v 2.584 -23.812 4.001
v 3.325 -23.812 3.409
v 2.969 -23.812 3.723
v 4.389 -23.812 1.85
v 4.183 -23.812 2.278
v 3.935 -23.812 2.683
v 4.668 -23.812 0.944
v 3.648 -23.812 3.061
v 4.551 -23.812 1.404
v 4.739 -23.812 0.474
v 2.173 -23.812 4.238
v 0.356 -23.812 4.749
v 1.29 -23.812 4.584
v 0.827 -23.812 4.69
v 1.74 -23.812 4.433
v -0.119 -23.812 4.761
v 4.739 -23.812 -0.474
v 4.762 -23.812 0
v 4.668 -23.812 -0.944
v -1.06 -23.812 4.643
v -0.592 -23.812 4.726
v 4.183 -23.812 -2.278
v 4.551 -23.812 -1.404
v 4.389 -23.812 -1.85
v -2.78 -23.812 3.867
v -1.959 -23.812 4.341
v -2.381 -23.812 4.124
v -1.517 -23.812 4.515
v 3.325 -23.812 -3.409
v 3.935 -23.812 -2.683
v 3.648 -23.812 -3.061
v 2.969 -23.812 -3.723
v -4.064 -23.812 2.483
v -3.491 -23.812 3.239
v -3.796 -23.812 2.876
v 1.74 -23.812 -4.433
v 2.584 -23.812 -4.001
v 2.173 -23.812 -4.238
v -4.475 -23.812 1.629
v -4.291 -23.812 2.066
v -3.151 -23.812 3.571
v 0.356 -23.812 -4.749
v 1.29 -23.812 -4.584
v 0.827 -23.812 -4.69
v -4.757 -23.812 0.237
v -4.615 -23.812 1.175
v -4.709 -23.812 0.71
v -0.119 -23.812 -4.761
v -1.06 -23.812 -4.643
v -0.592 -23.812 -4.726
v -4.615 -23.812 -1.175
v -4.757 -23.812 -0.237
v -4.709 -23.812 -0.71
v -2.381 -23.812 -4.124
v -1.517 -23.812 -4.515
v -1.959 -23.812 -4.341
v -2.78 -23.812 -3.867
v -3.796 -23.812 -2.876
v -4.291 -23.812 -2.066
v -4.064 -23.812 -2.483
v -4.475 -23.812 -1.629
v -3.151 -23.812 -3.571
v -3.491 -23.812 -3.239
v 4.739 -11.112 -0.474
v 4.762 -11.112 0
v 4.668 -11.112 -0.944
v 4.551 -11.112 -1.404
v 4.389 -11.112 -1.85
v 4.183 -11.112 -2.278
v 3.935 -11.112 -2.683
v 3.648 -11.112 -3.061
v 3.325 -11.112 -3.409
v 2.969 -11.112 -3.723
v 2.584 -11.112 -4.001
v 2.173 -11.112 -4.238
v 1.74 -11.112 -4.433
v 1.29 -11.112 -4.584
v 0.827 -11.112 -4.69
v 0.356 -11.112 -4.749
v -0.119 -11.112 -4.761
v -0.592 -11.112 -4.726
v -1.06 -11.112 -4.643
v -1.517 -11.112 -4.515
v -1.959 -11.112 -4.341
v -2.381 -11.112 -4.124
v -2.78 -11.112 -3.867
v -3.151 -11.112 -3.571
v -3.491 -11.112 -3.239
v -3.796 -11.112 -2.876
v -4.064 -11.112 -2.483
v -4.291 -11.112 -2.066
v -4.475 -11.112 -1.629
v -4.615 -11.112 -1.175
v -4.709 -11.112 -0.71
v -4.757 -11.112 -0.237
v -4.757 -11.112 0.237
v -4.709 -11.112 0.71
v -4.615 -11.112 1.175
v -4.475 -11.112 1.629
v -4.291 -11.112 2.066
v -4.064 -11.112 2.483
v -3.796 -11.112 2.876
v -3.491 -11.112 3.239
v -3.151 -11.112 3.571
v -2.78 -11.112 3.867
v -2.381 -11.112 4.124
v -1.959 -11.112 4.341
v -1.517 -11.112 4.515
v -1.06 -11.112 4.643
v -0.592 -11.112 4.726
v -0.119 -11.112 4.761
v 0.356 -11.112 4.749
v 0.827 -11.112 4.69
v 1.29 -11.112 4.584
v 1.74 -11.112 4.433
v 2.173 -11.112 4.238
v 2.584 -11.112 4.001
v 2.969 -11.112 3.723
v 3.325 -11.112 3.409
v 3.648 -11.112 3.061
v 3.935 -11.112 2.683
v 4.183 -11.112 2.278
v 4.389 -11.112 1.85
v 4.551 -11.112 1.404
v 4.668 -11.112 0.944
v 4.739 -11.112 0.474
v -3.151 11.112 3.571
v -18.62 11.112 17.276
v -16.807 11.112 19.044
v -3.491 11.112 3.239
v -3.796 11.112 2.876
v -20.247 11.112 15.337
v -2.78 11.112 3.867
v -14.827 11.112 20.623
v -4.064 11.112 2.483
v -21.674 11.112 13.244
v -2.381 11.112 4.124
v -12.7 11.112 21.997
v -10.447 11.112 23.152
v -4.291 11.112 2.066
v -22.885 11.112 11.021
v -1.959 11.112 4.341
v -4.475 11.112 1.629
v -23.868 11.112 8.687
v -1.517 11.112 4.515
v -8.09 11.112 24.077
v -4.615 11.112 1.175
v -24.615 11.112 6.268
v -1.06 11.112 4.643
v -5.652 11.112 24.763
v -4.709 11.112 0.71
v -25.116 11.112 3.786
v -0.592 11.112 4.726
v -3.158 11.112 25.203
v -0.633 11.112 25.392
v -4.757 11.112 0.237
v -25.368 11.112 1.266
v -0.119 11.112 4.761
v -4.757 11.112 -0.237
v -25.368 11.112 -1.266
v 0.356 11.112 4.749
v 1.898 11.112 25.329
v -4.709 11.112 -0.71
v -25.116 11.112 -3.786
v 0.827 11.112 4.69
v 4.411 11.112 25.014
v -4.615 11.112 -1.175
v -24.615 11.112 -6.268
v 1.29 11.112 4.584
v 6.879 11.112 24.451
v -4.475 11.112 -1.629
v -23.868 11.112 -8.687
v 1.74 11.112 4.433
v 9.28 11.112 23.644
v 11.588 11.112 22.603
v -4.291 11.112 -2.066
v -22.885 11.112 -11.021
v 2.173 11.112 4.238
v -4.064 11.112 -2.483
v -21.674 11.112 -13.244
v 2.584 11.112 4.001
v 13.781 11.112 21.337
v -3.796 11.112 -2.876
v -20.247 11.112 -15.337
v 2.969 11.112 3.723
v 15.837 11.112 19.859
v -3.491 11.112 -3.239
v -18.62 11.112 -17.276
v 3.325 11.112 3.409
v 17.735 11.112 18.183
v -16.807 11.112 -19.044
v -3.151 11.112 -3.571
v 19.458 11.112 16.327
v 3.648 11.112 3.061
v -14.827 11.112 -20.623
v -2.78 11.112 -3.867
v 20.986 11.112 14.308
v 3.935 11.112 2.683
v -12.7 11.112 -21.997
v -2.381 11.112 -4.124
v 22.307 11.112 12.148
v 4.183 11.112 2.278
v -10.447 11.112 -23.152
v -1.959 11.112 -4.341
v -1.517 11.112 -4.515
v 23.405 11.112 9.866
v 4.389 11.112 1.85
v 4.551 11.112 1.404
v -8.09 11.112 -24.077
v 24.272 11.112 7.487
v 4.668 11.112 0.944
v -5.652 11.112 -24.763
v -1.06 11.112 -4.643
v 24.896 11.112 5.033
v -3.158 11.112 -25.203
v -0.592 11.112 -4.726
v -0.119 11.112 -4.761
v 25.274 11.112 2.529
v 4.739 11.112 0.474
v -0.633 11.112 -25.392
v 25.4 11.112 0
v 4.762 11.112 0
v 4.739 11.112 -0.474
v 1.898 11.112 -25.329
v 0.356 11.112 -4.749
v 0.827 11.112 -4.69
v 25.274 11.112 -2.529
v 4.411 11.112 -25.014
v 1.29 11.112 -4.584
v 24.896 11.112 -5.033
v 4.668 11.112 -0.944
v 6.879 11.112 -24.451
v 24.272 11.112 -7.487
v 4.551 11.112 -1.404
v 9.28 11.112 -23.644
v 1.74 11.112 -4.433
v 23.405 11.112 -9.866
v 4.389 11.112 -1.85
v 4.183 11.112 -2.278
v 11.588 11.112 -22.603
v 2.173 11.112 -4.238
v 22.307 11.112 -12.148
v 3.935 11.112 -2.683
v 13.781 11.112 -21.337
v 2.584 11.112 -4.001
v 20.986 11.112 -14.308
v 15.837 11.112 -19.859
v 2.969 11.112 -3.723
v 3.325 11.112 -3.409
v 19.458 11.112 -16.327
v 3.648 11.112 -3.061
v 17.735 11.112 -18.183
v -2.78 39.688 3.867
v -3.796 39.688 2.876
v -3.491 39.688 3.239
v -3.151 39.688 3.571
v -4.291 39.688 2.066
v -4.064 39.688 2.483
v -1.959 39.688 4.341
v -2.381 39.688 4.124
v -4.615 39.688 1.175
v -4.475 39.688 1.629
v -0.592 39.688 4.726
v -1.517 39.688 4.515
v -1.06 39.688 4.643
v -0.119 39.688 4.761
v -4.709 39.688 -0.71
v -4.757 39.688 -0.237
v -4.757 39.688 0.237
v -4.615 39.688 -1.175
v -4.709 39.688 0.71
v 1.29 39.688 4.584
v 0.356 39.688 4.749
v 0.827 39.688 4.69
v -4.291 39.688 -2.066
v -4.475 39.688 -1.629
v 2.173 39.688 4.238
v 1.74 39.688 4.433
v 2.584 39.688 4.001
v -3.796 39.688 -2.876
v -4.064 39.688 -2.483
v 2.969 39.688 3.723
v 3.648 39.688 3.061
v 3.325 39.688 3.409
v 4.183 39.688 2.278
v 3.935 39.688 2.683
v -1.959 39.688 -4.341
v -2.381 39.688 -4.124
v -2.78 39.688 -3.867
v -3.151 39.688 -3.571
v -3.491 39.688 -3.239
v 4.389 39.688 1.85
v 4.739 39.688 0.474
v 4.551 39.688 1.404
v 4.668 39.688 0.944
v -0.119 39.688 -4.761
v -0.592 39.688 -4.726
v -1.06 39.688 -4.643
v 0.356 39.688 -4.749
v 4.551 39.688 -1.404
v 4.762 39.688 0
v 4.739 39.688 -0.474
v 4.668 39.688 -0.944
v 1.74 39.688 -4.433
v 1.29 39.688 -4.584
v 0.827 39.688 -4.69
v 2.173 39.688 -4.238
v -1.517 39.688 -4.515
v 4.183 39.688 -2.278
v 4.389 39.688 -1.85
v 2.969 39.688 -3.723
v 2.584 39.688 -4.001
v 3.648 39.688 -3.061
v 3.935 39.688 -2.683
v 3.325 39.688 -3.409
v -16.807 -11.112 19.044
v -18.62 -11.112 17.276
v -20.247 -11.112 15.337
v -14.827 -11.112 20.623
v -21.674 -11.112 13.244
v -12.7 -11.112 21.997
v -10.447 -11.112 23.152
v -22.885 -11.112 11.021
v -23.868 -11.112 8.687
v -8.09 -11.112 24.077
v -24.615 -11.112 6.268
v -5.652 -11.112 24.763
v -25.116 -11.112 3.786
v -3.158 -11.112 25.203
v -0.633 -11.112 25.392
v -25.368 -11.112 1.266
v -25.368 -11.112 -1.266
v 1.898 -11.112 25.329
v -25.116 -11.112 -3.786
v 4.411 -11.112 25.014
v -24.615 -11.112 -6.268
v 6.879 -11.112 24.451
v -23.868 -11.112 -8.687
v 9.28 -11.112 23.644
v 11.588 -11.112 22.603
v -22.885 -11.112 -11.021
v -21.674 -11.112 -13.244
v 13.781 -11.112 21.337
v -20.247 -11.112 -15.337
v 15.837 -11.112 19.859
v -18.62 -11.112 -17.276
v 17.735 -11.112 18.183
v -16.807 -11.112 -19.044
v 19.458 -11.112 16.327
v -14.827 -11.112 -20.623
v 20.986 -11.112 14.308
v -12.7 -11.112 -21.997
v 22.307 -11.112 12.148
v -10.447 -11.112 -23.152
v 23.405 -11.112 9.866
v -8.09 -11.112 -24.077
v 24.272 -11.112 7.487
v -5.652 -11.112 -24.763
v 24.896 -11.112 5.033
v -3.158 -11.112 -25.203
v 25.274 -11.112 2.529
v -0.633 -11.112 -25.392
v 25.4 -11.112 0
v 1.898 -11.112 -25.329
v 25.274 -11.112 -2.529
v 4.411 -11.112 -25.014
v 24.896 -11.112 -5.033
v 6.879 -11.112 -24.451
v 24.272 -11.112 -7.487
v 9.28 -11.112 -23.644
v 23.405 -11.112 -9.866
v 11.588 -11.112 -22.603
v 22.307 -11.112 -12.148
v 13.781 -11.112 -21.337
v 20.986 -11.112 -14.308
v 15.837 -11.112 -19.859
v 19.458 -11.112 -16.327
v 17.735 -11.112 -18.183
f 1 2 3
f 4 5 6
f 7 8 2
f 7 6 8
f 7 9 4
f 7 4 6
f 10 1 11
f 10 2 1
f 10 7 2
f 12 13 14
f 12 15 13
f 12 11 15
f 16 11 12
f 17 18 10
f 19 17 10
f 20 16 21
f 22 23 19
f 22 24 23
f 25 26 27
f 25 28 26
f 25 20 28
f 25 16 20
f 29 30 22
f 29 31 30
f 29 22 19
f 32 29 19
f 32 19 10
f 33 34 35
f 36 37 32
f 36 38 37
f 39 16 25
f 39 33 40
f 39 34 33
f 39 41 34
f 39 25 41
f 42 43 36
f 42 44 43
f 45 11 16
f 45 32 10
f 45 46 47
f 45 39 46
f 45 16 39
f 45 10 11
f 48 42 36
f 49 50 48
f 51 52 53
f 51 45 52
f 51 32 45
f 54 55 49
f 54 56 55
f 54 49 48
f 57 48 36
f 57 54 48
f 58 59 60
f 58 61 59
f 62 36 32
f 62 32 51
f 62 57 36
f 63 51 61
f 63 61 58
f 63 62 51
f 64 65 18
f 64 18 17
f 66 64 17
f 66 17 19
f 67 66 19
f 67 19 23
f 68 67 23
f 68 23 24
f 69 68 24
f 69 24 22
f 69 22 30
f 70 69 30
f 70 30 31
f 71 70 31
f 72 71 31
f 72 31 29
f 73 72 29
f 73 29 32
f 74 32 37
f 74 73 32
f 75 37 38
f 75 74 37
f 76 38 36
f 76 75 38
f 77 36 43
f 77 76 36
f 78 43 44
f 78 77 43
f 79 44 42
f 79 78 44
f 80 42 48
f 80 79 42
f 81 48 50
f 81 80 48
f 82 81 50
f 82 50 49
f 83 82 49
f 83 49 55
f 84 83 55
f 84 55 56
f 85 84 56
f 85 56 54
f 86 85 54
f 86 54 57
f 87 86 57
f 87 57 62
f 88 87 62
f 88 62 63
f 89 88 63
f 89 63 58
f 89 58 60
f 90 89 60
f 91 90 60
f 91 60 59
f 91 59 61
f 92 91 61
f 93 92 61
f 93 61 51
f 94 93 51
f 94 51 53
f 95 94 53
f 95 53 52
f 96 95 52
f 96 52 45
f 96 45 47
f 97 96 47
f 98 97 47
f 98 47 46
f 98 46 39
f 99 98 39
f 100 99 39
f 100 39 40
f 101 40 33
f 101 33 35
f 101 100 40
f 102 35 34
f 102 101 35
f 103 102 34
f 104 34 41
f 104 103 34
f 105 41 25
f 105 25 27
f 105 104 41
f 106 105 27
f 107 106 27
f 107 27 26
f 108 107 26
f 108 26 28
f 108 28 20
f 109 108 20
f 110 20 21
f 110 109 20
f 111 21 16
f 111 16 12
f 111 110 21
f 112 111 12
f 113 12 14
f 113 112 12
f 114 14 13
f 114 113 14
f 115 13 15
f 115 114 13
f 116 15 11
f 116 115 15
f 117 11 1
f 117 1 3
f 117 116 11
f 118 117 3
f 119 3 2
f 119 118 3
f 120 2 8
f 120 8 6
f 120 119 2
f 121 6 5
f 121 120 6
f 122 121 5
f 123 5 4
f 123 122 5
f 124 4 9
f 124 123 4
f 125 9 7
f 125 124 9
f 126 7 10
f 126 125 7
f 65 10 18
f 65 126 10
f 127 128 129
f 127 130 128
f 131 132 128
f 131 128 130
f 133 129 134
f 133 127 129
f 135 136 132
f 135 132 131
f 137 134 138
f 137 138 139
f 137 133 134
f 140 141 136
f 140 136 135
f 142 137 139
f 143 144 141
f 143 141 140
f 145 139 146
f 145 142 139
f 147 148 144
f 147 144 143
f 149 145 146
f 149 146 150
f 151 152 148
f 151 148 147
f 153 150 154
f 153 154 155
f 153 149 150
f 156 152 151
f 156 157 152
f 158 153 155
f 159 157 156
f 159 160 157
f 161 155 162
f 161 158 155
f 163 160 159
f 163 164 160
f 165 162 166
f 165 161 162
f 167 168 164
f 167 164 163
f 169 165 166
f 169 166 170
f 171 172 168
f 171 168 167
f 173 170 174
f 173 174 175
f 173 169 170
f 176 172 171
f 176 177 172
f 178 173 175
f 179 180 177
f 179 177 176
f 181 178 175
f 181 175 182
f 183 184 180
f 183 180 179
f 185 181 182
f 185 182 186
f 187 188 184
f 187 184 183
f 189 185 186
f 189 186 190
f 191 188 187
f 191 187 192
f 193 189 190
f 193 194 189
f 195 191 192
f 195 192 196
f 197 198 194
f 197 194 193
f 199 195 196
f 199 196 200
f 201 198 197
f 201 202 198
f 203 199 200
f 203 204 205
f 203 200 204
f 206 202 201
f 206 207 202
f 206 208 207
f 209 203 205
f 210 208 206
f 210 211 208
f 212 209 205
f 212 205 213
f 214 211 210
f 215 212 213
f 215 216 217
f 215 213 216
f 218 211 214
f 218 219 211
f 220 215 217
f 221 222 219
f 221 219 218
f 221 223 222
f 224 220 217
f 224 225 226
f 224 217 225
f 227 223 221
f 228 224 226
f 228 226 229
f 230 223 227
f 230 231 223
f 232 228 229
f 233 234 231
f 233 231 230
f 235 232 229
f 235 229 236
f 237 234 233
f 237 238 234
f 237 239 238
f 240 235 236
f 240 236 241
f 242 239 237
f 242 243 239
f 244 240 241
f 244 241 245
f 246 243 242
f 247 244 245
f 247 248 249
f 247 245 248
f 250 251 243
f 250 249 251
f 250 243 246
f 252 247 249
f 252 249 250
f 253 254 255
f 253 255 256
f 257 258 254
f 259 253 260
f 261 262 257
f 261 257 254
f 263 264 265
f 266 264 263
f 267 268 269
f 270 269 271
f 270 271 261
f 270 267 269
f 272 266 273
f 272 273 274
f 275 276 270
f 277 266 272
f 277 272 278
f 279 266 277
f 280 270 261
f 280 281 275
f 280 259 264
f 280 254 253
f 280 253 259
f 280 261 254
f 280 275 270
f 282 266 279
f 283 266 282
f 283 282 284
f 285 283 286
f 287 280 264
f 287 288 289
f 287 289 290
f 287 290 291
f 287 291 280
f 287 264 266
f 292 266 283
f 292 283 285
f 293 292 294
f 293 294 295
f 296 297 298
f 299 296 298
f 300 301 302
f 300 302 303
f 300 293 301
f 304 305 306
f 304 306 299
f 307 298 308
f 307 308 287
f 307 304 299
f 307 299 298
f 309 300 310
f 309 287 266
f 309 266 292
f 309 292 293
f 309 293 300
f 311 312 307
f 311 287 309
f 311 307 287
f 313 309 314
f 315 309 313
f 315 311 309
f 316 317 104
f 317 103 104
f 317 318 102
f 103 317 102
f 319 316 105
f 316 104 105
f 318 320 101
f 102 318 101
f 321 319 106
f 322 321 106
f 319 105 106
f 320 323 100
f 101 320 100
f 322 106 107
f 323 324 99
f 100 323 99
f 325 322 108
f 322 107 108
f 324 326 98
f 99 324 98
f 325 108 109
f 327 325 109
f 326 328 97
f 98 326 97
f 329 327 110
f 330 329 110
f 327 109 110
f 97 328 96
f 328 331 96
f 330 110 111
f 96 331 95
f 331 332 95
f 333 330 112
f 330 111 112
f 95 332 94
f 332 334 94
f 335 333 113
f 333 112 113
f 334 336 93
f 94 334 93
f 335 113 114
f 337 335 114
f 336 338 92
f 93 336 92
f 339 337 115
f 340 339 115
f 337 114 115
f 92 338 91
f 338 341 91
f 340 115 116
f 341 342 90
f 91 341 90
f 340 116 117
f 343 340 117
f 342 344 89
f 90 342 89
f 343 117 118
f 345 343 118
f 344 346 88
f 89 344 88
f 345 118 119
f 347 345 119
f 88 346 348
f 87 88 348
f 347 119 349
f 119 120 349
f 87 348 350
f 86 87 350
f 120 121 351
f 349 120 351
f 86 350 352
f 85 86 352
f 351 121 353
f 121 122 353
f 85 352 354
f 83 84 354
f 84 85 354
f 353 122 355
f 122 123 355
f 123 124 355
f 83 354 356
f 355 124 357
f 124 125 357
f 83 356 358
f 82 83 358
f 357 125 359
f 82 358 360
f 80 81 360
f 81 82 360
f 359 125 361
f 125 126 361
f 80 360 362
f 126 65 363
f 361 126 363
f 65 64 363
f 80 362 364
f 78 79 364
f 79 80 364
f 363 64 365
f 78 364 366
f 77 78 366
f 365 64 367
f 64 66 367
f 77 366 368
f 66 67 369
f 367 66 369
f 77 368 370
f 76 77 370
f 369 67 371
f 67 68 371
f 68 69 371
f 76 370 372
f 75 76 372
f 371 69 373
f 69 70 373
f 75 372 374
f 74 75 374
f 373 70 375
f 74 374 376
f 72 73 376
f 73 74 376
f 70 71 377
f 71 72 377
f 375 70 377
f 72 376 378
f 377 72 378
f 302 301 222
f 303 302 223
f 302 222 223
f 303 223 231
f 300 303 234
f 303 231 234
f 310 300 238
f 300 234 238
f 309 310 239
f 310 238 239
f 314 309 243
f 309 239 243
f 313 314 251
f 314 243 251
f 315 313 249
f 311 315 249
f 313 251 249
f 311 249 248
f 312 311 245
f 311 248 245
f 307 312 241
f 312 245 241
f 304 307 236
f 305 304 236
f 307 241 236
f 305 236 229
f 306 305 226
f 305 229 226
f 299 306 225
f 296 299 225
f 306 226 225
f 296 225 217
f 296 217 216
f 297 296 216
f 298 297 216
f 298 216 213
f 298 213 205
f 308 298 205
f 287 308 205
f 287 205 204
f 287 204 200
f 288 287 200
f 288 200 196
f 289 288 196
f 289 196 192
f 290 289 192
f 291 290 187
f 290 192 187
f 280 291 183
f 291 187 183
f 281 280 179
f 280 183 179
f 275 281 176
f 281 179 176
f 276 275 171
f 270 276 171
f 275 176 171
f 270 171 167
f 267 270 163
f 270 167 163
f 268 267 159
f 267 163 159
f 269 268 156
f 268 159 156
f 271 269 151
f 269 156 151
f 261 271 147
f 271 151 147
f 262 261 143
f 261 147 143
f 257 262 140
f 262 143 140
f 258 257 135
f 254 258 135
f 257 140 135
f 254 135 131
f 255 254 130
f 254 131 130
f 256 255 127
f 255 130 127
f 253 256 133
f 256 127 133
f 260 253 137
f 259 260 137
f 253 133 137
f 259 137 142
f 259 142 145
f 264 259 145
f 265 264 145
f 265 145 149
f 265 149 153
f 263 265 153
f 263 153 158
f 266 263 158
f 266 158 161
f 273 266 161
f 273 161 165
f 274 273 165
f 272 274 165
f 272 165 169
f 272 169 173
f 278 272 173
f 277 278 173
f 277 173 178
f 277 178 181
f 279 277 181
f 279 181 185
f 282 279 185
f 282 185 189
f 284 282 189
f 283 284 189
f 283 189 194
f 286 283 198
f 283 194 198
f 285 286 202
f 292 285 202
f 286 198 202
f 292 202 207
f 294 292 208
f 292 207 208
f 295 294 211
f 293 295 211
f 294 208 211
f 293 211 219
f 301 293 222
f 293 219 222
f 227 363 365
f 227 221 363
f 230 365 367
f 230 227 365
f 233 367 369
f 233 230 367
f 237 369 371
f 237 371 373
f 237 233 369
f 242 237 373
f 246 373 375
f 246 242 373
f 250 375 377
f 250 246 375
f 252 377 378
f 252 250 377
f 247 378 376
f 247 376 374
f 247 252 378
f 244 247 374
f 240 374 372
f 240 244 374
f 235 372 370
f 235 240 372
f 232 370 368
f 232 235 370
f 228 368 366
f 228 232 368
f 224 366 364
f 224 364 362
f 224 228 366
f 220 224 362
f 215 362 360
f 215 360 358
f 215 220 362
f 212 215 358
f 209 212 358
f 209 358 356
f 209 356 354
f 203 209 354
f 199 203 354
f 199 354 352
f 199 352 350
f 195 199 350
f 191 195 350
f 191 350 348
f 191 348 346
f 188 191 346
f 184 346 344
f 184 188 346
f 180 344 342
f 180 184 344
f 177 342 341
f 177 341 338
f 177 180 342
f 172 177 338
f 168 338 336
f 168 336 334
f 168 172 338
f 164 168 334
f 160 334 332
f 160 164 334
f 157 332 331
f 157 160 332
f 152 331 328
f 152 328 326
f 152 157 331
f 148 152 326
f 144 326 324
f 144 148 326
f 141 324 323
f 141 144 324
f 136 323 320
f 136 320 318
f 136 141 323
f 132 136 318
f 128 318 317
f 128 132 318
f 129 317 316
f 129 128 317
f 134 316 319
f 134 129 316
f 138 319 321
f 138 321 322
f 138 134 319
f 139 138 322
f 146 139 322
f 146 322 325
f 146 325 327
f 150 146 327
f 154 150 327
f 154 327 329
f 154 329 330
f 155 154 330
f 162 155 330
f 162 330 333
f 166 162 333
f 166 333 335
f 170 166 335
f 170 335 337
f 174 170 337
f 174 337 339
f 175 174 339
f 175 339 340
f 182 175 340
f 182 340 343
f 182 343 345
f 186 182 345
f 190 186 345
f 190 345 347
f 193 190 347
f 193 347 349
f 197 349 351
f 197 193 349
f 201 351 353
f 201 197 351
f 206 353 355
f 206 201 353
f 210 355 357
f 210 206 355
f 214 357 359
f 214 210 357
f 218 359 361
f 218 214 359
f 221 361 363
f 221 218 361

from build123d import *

# Parameters (mm, degrees)
SKETCH1_R           = 25.4
BOSS_EXTRUDE1_DEPTH = 11.1125
SKETCH2_R           = 4.7625
BOSS_EXTRUDE2_DEPTH = 28.575
SKETCH3_R           = 4.7625
CUT_EXTRUDE1_DEPTH  = 15.875


with BuildPart() as part:
    # Sketch1 → Boss-Extrude1 (new body, symmetric)
    with BuildSketch(Plane(origin=(0, 0, 0), x_dir=(1, 0, 0), z_dir=(0, 1, 0))):
        Circle(SKETCH1_R)
    extrude(amount=BOSS_EXTRUDE1_DEPTH, both=True)

    # Sketch2 → Boss-Extrude2 (add)
    with BuildSketch(Plane(origin=(0, 11.1125, 0), x_dir=(1, 0, 0), z_dir=(0, 1, 0))):
        Circle(SKETCH2_R)
    boss_extrude2 = extrude(amount=BOSS_EXTRUDE2_DEPTH)

    # Mirror1: Boss-Extrude2 across plane
    add(boss_extrude2.mirror(Plane.ZX))

    # Sketch3 → Cut-Extrude1 (cut)
    with BuildSketch(Plane(origin=(0, -39.6875, 0), x_dir=(-1, 0, 0), z_dir=(0, -1, 0))):
        Circle(SKETCH3_R)
    extrude(amount=-CUT_EXTRUDE1_DEPTH, mode=Mode.SUBTRACT)


solid = part.part
